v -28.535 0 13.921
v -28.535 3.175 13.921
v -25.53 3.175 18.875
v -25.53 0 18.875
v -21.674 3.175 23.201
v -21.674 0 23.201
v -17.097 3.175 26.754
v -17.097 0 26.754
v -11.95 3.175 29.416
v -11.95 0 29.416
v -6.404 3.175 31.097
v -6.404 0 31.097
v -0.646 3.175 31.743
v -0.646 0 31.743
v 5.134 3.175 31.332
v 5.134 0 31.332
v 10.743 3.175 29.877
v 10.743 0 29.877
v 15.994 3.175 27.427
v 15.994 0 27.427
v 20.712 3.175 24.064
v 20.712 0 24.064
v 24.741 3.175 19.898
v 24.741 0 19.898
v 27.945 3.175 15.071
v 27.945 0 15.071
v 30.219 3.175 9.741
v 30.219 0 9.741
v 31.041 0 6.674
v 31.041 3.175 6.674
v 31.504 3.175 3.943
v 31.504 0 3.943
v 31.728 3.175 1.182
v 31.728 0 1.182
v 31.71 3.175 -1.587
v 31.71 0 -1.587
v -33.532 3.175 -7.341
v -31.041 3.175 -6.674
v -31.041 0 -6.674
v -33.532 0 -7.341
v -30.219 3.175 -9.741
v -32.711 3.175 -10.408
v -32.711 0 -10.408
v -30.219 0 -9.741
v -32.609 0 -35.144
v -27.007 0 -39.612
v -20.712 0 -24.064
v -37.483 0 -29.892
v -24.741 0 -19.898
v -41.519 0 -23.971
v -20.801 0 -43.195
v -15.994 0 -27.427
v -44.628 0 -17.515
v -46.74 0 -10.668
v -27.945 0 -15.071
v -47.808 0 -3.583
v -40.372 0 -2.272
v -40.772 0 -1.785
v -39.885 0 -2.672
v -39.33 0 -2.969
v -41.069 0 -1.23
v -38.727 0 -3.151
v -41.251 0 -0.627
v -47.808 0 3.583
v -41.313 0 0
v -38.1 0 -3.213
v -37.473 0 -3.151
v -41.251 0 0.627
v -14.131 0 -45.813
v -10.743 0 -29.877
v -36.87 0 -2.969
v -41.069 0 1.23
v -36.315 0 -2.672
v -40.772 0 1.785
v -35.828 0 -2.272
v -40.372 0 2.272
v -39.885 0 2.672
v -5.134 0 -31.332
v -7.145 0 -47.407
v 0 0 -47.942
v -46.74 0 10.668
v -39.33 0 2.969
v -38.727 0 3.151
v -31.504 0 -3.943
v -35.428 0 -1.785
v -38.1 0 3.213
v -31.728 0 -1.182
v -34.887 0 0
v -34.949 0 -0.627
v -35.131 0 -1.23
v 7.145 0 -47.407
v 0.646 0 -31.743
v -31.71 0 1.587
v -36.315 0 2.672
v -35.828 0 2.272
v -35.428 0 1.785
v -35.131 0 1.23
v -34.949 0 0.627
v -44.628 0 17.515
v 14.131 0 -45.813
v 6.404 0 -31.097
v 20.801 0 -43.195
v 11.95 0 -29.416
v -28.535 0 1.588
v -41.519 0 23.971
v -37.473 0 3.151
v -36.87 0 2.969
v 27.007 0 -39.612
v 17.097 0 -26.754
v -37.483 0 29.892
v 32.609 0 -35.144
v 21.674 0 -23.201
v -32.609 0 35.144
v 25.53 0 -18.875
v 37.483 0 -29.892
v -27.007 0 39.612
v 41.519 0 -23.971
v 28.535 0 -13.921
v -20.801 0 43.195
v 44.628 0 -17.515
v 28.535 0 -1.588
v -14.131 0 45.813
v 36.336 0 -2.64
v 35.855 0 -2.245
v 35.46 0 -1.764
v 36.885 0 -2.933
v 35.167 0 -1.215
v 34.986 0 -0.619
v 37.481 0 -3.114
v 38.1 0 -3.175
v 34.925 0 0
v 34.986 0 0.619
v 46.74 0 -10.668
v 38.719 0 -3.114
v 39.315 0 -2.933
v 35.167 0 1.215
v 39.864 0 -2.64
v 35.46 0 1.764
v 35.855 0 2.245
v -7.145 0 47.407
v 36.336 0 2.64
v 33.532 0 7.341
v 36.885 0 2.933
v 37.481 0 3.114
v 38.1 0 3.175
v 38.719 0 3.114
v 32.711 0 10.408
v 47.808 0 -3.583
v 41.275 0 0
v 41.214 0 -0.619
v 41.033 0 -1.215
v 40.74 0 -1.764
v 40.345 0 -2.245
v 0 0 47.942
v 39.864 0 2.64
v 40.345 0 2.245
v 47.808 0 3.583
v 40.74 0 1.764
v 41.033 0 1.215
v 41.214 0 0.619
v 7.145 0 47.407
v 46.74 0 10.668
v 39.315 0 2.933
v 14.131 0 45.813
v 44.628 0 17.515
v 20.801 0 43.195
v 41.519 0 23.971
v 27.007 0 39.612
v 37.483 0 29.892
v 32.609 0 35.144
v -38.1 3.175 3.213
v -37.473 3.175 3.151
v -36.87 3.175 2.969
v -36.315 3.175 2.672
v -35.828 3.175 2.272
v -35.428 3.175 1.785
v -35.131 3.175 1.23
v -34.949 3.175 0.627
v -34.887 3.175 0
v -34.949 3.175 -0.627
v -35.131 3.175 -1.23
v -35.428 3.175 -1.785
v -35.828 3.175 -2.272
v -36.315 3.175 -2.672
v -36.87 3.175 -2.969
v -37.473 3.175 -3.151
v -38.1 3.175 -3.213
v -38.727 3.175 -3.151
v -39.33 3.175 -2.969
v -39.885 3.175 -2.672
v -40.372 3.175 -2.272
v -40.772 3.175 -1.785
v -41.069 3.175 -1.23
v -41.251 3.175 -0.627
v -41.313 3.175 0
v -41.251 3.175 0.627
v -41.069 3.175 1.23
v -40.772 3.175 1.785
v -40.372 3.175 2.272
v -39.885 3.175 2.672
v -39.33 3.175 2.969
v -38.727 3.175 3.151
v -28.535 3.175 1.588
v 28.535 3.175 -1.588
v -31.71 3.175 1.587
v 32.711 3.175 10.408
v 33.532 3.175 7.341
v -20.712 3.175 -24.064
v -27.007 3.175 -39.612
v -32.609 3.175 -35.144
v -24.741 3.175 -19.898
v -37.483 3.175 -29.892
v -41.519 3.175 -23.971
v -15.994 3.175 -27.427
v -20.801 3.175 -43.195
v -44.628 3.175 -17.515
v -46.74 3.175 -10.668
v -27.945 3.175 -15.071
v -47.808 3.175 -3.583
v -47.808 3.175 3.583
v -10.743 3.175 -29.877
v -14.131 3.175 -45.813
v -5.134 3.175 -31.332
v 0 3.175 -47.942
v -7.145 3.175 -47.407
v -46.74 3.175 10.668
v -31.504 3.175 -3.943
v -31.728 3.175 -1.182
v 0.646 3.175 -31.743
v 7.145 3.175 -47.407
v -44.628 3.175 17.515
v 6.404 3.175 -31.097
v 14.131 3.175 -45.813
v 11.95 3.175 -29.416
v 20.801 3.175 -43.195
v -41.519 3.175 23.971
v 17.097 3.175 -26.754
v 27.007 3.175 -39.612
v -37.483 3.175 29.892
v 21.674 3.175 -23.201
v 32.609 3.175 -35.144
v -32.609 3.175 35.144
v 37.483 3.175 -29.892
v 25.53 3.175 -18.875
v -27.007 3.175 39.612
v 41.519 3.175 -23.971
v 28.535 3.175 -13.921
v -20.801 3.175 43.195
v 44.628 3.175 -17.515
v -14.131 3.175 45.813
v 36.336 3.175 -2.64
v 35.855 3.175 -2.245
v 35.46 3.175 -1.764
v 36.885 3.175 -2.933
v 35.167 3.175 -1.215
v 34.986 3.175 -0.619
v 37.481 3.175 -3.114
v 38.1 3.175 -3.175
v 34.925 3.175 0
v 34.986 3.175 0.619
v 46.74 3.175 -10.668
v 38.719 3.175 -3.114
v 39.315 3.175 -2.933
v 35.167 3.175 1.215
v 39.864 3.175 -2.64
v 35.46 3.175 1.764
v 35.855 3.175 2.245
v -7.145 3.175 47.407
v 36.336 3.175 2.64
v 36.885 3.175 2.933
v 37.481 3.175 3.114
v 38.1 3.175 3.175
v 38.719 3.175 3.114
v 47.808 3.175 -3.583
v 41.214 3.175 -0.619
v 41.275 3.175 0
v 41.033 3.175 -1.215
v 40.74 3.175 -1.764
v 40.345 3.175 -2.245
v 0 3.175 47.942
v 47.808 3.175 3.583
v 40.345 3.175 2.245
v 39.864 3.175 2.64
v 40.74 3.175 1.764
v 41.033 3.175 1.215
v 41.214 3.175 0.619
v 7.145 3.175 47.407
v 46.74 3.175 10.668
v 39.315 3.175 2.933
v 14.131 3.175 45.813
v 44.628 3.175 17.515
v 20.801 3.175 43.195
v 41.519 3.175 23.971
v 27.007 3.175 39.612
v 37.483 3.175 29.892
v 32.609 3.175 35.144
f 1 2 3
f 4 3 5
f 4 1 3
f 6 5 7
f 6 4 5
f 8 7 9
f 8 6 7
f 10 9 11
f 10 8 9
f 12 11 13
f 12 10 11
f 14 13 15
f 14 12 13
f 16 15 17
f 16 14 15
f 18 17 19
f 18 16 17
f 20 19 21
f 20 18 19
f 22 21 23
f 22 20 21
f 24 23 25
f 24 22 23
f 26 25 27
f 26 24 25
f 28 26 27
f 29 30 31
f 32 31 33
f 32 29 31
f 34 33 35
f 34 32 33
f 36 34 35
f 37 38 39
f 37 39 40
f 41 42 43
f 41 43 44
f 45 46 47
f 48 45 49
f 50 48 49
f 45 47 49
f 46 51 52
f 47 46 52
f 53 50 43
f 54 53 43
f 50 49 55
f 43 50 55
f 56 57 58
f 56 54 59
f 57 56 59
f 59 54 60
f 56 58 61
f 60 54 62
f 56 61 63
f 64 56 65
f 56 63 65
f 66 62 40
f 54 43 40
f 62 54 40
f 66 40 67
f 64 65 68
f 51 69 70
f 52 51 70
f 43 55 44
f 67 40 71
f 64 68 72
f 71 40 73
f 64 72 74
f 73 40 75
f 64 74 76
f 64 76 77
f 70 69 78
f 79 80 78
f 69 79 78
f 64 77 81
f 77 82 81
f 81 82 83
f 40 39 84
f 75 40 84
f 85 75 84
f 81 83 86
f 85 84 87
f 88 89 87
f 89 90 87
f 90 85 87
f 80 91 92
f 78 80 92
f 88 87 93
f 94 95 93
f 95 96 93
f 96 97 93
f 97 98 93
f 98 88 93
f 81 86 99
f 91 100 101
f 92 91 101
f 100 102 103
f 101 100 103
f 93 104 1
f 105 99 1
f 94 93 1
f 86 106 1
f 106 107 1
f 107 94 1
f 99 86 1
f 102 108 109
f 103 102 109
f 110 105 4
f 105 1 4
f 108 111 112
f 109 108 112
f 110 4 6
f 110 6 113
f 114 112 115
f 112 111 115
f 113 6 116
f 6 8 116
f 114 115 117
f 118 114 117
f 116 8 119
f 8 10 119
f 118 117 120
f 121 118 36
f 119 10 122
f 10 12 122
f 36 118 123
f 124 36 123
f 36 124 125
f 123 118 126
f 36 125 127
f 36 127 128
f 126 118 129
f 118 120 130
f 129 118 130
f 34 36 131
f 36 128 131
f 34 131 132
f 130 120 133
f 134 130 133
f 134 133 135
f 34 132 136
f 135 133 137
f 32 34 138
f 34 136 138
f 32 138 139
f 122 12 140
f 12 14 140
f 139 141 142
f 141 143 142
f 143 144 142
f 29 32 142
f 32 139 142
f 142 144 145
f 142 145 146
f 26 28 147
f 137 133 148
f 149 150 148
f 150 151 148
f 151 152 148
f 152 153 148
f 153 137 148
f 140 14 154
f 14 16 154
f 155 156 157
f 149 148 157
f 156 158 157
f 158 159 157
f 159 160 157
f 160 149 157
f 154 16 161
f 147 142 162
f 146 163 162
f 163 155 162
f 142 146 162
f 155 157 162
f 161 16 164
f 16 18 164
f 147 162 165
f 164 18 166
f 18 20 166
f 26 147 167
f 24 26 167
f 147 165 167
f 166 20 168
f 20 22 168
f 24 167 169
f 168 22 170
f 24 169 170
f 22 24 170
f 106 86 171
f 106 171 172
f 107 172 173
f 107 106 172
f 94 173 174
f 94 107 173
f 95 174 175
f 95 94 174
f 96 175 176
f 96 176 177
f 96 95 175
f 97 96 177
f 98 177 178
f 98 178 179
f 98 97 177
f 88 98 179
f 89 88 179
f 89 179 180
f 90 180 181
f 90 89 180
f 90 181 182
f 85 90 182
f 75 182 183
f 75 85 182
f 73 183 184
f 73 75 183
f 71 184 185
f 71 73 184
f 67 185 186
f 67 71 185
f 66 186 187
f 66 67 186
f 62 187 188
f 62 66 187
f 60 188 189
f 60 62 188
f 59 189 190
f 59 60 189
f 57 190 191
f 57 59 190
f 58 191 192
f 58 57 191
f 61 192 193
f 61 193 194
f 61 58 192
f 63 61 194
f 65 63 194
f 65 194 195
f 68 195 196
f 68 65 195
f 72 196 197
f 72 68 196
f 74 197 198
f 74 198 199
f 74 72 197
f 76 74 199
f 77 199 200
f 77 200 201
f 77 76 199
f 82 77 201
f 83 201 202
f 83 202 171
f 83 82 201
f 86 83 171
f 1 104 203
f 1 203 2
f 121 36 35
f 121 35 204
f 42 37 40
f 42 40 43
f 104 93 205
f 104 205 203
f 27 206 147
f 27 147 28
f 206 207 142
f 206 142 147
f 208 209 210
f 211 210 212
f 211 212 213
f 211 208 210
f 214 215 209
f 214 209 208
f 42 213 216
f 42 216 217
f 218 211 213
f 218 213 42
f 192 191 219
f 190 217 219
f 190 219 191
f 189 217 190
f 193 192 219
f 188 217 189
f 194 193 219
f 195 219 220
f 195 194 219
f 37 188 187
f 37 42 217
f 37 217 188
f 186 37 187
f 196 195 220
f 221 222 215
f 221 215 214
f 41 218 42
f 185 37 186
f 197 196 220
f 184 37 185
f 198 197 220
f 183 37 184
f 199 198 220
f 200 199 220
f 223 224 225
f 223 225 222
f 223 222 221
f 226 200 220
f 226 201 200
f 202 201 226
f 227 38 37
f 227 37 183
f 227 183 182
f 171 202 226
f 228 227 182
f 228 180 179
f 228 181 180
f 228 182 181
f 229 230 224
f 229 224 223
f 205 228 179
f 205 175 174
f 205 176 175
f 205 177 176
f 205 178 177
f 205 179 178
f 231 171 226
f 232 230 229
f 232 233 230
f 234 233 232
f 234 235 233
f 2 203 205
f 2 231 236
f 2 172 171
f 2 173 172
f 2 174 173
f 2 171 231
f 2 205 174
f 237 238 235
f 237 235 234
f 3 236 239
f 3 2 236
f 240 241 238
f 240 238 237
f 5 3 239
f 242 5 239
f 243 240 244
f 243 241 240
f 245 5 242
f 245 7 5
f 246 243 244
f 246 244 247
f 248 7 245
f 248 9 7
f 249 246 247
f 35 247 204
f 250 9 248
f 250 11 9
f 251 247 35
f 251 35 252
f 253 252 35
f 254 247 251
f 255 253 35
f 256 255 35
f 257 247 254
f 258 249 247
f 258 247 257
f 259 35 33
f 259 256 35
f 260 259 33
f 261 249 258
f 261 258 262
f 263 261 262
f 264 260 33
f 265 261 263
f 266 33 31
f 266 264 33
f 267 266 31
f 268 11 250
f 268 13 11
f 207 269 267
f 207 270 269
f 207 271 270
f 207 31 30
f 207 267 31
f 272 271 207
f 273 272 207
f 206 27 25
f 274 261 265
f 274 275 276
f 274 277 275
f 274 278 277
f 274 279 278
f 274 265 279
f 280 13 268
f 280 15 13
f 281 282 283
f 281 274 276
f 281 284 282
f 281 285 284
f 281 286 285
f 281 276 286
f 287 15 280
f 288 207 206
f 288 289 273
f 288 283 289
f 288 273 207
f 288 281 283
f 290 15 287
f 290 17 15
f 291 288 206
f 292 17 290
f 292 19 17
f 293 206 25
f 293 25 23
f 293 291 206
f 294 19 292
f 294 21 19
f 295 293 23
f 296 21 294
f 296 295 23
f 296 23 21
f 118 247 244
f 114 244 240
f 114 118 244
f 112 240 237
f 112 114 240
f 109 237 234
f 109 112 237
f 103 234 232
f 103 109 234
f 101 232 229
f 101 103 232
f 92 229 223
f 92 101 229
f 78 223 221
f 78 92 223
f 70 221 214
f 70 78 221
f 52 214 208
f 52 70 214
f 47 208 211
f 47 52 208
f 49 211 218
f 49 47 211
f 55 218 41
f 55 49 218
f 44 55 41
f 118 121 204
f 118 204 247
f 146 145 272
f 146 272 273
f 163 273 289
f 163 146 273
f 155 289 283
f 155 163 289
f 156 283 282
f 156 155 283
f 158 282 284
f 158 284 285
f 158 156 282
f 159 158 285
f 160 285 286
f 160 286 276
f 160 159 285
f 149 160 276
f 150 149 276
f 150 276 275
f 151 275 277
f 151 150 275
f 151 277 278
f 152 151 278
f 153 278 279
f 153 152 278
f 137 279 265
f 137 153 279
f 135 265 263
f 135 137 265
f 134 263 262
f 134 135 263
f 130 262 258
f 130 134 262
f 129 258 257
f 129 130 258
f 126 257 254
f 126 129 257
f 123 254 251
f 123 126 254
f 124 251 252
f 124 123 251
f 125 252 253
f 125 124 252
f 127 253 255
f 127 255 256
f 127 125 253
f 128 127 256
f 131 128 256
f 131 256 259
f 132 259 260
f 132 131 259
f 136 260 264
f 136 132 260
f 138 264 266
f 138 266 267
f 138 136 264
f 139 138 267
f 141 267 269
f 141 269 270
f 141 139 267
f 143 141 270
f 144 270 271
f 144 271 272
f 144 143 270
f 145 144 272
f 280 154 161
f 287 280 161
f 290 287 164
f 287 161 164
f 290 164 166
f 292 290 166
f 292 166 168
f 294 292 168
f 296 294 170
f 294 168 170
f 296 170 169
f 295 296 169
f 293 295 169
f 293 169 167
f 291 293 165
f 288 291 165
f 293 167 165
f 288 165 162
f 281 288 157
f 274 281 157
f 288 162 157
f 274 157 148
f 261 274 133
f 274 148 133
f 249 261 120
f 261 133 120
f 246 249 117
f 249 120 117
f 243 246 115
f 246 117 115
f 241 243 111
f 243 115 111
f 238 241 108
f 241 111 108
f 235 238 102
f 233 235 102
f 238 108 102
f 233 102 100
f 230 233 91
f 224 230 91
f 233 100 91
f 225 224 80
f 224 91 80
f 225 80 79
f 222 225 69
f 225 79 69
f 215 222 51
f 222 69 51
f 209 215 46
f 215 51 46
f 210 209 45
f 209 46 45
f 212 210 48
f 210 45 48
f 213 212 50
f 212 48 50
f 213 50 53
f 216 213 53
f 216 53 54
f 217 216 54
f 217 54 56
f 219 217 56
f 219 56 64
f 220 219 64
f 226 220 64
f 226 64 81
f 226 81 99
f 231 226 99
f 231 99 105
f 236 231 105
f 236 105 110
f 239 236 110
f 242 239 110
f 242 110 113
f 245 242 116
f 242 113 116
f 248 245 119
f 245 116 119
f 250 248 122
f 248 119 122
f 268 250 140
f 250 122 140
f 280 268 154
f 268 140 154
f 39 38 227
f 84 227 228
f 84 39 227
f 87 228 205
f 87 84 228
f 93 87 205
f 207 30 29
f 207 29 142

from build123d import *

# Parameters (mm, degrees)
SKETCH1_R           = 47.9425
SKETCH1_R_2         = 3.2131
SKETCH1_R_3         = 3.175
BOSS_EXTRUDE1_DEPTH = 3.175
CUT_EXTRUDE1_DEPTH  = 68.875232873


with BuildPart() as part:
    # Sketch1 → Boss-Extrude1 (new body)
    with BuildSketch(Plane(origin=(0, 0, 0), x_dir=(1, 0, 0), z_dir=(0, 1, 0))):
        Circle(SKETCH1_R)
        with Locations((-38.1, 0)):
            Circle(SKETCH1_R_2, mode=Mode.SUBTRACT)
        with Locations((38.1, 0)):
            Circle(SKETCH1_R_3, mode=Mode.SUBTRACT)
        with BuildLine():
            Line((-31.710287664, -1.5875), (-28.535287664, -1.5875))
            Line((-28.535287664, -1.5875), (-28.535287664, -13.921201741))
            ThreePointArc((-28.535287664, -13.921201741), (7.915182479, -30.74755903), (31.710287664, 1.5875))
            Line((31.710287664, 1.5875), (28.535287664, 1.5875))
            Line((28.535287664, 1.5875), (28.535287664, 13.921201741))
            ThreePointArc((28.535287664, 13.921201741), (-7.915182479, 30.74755903), (-31.710287664, -1.5875))
        make_face(mode=Mode.SUBTRACT)
    extrude(amount=BOSS_EXTRUDE1_DEPTH)

    # Sketch2 → Cut-Extrude1 (cut, through all)
    with BuildSketch(Plane(origin=(0, 3.175, 0), x_dir=(1, 0, 0), z_dir=(0, 1, 0))):
        Polygon((-32.710721349, 10.408312306), (-33.532471818, 7.341497807), (32.710721349, -10.408312306), (33.532471818, -7.341497807), align=None)
    extrude(amount=-CUT_EXTRUDE1_DEPTH, mode=Mode.SUBTRACT)


solid = part.part
